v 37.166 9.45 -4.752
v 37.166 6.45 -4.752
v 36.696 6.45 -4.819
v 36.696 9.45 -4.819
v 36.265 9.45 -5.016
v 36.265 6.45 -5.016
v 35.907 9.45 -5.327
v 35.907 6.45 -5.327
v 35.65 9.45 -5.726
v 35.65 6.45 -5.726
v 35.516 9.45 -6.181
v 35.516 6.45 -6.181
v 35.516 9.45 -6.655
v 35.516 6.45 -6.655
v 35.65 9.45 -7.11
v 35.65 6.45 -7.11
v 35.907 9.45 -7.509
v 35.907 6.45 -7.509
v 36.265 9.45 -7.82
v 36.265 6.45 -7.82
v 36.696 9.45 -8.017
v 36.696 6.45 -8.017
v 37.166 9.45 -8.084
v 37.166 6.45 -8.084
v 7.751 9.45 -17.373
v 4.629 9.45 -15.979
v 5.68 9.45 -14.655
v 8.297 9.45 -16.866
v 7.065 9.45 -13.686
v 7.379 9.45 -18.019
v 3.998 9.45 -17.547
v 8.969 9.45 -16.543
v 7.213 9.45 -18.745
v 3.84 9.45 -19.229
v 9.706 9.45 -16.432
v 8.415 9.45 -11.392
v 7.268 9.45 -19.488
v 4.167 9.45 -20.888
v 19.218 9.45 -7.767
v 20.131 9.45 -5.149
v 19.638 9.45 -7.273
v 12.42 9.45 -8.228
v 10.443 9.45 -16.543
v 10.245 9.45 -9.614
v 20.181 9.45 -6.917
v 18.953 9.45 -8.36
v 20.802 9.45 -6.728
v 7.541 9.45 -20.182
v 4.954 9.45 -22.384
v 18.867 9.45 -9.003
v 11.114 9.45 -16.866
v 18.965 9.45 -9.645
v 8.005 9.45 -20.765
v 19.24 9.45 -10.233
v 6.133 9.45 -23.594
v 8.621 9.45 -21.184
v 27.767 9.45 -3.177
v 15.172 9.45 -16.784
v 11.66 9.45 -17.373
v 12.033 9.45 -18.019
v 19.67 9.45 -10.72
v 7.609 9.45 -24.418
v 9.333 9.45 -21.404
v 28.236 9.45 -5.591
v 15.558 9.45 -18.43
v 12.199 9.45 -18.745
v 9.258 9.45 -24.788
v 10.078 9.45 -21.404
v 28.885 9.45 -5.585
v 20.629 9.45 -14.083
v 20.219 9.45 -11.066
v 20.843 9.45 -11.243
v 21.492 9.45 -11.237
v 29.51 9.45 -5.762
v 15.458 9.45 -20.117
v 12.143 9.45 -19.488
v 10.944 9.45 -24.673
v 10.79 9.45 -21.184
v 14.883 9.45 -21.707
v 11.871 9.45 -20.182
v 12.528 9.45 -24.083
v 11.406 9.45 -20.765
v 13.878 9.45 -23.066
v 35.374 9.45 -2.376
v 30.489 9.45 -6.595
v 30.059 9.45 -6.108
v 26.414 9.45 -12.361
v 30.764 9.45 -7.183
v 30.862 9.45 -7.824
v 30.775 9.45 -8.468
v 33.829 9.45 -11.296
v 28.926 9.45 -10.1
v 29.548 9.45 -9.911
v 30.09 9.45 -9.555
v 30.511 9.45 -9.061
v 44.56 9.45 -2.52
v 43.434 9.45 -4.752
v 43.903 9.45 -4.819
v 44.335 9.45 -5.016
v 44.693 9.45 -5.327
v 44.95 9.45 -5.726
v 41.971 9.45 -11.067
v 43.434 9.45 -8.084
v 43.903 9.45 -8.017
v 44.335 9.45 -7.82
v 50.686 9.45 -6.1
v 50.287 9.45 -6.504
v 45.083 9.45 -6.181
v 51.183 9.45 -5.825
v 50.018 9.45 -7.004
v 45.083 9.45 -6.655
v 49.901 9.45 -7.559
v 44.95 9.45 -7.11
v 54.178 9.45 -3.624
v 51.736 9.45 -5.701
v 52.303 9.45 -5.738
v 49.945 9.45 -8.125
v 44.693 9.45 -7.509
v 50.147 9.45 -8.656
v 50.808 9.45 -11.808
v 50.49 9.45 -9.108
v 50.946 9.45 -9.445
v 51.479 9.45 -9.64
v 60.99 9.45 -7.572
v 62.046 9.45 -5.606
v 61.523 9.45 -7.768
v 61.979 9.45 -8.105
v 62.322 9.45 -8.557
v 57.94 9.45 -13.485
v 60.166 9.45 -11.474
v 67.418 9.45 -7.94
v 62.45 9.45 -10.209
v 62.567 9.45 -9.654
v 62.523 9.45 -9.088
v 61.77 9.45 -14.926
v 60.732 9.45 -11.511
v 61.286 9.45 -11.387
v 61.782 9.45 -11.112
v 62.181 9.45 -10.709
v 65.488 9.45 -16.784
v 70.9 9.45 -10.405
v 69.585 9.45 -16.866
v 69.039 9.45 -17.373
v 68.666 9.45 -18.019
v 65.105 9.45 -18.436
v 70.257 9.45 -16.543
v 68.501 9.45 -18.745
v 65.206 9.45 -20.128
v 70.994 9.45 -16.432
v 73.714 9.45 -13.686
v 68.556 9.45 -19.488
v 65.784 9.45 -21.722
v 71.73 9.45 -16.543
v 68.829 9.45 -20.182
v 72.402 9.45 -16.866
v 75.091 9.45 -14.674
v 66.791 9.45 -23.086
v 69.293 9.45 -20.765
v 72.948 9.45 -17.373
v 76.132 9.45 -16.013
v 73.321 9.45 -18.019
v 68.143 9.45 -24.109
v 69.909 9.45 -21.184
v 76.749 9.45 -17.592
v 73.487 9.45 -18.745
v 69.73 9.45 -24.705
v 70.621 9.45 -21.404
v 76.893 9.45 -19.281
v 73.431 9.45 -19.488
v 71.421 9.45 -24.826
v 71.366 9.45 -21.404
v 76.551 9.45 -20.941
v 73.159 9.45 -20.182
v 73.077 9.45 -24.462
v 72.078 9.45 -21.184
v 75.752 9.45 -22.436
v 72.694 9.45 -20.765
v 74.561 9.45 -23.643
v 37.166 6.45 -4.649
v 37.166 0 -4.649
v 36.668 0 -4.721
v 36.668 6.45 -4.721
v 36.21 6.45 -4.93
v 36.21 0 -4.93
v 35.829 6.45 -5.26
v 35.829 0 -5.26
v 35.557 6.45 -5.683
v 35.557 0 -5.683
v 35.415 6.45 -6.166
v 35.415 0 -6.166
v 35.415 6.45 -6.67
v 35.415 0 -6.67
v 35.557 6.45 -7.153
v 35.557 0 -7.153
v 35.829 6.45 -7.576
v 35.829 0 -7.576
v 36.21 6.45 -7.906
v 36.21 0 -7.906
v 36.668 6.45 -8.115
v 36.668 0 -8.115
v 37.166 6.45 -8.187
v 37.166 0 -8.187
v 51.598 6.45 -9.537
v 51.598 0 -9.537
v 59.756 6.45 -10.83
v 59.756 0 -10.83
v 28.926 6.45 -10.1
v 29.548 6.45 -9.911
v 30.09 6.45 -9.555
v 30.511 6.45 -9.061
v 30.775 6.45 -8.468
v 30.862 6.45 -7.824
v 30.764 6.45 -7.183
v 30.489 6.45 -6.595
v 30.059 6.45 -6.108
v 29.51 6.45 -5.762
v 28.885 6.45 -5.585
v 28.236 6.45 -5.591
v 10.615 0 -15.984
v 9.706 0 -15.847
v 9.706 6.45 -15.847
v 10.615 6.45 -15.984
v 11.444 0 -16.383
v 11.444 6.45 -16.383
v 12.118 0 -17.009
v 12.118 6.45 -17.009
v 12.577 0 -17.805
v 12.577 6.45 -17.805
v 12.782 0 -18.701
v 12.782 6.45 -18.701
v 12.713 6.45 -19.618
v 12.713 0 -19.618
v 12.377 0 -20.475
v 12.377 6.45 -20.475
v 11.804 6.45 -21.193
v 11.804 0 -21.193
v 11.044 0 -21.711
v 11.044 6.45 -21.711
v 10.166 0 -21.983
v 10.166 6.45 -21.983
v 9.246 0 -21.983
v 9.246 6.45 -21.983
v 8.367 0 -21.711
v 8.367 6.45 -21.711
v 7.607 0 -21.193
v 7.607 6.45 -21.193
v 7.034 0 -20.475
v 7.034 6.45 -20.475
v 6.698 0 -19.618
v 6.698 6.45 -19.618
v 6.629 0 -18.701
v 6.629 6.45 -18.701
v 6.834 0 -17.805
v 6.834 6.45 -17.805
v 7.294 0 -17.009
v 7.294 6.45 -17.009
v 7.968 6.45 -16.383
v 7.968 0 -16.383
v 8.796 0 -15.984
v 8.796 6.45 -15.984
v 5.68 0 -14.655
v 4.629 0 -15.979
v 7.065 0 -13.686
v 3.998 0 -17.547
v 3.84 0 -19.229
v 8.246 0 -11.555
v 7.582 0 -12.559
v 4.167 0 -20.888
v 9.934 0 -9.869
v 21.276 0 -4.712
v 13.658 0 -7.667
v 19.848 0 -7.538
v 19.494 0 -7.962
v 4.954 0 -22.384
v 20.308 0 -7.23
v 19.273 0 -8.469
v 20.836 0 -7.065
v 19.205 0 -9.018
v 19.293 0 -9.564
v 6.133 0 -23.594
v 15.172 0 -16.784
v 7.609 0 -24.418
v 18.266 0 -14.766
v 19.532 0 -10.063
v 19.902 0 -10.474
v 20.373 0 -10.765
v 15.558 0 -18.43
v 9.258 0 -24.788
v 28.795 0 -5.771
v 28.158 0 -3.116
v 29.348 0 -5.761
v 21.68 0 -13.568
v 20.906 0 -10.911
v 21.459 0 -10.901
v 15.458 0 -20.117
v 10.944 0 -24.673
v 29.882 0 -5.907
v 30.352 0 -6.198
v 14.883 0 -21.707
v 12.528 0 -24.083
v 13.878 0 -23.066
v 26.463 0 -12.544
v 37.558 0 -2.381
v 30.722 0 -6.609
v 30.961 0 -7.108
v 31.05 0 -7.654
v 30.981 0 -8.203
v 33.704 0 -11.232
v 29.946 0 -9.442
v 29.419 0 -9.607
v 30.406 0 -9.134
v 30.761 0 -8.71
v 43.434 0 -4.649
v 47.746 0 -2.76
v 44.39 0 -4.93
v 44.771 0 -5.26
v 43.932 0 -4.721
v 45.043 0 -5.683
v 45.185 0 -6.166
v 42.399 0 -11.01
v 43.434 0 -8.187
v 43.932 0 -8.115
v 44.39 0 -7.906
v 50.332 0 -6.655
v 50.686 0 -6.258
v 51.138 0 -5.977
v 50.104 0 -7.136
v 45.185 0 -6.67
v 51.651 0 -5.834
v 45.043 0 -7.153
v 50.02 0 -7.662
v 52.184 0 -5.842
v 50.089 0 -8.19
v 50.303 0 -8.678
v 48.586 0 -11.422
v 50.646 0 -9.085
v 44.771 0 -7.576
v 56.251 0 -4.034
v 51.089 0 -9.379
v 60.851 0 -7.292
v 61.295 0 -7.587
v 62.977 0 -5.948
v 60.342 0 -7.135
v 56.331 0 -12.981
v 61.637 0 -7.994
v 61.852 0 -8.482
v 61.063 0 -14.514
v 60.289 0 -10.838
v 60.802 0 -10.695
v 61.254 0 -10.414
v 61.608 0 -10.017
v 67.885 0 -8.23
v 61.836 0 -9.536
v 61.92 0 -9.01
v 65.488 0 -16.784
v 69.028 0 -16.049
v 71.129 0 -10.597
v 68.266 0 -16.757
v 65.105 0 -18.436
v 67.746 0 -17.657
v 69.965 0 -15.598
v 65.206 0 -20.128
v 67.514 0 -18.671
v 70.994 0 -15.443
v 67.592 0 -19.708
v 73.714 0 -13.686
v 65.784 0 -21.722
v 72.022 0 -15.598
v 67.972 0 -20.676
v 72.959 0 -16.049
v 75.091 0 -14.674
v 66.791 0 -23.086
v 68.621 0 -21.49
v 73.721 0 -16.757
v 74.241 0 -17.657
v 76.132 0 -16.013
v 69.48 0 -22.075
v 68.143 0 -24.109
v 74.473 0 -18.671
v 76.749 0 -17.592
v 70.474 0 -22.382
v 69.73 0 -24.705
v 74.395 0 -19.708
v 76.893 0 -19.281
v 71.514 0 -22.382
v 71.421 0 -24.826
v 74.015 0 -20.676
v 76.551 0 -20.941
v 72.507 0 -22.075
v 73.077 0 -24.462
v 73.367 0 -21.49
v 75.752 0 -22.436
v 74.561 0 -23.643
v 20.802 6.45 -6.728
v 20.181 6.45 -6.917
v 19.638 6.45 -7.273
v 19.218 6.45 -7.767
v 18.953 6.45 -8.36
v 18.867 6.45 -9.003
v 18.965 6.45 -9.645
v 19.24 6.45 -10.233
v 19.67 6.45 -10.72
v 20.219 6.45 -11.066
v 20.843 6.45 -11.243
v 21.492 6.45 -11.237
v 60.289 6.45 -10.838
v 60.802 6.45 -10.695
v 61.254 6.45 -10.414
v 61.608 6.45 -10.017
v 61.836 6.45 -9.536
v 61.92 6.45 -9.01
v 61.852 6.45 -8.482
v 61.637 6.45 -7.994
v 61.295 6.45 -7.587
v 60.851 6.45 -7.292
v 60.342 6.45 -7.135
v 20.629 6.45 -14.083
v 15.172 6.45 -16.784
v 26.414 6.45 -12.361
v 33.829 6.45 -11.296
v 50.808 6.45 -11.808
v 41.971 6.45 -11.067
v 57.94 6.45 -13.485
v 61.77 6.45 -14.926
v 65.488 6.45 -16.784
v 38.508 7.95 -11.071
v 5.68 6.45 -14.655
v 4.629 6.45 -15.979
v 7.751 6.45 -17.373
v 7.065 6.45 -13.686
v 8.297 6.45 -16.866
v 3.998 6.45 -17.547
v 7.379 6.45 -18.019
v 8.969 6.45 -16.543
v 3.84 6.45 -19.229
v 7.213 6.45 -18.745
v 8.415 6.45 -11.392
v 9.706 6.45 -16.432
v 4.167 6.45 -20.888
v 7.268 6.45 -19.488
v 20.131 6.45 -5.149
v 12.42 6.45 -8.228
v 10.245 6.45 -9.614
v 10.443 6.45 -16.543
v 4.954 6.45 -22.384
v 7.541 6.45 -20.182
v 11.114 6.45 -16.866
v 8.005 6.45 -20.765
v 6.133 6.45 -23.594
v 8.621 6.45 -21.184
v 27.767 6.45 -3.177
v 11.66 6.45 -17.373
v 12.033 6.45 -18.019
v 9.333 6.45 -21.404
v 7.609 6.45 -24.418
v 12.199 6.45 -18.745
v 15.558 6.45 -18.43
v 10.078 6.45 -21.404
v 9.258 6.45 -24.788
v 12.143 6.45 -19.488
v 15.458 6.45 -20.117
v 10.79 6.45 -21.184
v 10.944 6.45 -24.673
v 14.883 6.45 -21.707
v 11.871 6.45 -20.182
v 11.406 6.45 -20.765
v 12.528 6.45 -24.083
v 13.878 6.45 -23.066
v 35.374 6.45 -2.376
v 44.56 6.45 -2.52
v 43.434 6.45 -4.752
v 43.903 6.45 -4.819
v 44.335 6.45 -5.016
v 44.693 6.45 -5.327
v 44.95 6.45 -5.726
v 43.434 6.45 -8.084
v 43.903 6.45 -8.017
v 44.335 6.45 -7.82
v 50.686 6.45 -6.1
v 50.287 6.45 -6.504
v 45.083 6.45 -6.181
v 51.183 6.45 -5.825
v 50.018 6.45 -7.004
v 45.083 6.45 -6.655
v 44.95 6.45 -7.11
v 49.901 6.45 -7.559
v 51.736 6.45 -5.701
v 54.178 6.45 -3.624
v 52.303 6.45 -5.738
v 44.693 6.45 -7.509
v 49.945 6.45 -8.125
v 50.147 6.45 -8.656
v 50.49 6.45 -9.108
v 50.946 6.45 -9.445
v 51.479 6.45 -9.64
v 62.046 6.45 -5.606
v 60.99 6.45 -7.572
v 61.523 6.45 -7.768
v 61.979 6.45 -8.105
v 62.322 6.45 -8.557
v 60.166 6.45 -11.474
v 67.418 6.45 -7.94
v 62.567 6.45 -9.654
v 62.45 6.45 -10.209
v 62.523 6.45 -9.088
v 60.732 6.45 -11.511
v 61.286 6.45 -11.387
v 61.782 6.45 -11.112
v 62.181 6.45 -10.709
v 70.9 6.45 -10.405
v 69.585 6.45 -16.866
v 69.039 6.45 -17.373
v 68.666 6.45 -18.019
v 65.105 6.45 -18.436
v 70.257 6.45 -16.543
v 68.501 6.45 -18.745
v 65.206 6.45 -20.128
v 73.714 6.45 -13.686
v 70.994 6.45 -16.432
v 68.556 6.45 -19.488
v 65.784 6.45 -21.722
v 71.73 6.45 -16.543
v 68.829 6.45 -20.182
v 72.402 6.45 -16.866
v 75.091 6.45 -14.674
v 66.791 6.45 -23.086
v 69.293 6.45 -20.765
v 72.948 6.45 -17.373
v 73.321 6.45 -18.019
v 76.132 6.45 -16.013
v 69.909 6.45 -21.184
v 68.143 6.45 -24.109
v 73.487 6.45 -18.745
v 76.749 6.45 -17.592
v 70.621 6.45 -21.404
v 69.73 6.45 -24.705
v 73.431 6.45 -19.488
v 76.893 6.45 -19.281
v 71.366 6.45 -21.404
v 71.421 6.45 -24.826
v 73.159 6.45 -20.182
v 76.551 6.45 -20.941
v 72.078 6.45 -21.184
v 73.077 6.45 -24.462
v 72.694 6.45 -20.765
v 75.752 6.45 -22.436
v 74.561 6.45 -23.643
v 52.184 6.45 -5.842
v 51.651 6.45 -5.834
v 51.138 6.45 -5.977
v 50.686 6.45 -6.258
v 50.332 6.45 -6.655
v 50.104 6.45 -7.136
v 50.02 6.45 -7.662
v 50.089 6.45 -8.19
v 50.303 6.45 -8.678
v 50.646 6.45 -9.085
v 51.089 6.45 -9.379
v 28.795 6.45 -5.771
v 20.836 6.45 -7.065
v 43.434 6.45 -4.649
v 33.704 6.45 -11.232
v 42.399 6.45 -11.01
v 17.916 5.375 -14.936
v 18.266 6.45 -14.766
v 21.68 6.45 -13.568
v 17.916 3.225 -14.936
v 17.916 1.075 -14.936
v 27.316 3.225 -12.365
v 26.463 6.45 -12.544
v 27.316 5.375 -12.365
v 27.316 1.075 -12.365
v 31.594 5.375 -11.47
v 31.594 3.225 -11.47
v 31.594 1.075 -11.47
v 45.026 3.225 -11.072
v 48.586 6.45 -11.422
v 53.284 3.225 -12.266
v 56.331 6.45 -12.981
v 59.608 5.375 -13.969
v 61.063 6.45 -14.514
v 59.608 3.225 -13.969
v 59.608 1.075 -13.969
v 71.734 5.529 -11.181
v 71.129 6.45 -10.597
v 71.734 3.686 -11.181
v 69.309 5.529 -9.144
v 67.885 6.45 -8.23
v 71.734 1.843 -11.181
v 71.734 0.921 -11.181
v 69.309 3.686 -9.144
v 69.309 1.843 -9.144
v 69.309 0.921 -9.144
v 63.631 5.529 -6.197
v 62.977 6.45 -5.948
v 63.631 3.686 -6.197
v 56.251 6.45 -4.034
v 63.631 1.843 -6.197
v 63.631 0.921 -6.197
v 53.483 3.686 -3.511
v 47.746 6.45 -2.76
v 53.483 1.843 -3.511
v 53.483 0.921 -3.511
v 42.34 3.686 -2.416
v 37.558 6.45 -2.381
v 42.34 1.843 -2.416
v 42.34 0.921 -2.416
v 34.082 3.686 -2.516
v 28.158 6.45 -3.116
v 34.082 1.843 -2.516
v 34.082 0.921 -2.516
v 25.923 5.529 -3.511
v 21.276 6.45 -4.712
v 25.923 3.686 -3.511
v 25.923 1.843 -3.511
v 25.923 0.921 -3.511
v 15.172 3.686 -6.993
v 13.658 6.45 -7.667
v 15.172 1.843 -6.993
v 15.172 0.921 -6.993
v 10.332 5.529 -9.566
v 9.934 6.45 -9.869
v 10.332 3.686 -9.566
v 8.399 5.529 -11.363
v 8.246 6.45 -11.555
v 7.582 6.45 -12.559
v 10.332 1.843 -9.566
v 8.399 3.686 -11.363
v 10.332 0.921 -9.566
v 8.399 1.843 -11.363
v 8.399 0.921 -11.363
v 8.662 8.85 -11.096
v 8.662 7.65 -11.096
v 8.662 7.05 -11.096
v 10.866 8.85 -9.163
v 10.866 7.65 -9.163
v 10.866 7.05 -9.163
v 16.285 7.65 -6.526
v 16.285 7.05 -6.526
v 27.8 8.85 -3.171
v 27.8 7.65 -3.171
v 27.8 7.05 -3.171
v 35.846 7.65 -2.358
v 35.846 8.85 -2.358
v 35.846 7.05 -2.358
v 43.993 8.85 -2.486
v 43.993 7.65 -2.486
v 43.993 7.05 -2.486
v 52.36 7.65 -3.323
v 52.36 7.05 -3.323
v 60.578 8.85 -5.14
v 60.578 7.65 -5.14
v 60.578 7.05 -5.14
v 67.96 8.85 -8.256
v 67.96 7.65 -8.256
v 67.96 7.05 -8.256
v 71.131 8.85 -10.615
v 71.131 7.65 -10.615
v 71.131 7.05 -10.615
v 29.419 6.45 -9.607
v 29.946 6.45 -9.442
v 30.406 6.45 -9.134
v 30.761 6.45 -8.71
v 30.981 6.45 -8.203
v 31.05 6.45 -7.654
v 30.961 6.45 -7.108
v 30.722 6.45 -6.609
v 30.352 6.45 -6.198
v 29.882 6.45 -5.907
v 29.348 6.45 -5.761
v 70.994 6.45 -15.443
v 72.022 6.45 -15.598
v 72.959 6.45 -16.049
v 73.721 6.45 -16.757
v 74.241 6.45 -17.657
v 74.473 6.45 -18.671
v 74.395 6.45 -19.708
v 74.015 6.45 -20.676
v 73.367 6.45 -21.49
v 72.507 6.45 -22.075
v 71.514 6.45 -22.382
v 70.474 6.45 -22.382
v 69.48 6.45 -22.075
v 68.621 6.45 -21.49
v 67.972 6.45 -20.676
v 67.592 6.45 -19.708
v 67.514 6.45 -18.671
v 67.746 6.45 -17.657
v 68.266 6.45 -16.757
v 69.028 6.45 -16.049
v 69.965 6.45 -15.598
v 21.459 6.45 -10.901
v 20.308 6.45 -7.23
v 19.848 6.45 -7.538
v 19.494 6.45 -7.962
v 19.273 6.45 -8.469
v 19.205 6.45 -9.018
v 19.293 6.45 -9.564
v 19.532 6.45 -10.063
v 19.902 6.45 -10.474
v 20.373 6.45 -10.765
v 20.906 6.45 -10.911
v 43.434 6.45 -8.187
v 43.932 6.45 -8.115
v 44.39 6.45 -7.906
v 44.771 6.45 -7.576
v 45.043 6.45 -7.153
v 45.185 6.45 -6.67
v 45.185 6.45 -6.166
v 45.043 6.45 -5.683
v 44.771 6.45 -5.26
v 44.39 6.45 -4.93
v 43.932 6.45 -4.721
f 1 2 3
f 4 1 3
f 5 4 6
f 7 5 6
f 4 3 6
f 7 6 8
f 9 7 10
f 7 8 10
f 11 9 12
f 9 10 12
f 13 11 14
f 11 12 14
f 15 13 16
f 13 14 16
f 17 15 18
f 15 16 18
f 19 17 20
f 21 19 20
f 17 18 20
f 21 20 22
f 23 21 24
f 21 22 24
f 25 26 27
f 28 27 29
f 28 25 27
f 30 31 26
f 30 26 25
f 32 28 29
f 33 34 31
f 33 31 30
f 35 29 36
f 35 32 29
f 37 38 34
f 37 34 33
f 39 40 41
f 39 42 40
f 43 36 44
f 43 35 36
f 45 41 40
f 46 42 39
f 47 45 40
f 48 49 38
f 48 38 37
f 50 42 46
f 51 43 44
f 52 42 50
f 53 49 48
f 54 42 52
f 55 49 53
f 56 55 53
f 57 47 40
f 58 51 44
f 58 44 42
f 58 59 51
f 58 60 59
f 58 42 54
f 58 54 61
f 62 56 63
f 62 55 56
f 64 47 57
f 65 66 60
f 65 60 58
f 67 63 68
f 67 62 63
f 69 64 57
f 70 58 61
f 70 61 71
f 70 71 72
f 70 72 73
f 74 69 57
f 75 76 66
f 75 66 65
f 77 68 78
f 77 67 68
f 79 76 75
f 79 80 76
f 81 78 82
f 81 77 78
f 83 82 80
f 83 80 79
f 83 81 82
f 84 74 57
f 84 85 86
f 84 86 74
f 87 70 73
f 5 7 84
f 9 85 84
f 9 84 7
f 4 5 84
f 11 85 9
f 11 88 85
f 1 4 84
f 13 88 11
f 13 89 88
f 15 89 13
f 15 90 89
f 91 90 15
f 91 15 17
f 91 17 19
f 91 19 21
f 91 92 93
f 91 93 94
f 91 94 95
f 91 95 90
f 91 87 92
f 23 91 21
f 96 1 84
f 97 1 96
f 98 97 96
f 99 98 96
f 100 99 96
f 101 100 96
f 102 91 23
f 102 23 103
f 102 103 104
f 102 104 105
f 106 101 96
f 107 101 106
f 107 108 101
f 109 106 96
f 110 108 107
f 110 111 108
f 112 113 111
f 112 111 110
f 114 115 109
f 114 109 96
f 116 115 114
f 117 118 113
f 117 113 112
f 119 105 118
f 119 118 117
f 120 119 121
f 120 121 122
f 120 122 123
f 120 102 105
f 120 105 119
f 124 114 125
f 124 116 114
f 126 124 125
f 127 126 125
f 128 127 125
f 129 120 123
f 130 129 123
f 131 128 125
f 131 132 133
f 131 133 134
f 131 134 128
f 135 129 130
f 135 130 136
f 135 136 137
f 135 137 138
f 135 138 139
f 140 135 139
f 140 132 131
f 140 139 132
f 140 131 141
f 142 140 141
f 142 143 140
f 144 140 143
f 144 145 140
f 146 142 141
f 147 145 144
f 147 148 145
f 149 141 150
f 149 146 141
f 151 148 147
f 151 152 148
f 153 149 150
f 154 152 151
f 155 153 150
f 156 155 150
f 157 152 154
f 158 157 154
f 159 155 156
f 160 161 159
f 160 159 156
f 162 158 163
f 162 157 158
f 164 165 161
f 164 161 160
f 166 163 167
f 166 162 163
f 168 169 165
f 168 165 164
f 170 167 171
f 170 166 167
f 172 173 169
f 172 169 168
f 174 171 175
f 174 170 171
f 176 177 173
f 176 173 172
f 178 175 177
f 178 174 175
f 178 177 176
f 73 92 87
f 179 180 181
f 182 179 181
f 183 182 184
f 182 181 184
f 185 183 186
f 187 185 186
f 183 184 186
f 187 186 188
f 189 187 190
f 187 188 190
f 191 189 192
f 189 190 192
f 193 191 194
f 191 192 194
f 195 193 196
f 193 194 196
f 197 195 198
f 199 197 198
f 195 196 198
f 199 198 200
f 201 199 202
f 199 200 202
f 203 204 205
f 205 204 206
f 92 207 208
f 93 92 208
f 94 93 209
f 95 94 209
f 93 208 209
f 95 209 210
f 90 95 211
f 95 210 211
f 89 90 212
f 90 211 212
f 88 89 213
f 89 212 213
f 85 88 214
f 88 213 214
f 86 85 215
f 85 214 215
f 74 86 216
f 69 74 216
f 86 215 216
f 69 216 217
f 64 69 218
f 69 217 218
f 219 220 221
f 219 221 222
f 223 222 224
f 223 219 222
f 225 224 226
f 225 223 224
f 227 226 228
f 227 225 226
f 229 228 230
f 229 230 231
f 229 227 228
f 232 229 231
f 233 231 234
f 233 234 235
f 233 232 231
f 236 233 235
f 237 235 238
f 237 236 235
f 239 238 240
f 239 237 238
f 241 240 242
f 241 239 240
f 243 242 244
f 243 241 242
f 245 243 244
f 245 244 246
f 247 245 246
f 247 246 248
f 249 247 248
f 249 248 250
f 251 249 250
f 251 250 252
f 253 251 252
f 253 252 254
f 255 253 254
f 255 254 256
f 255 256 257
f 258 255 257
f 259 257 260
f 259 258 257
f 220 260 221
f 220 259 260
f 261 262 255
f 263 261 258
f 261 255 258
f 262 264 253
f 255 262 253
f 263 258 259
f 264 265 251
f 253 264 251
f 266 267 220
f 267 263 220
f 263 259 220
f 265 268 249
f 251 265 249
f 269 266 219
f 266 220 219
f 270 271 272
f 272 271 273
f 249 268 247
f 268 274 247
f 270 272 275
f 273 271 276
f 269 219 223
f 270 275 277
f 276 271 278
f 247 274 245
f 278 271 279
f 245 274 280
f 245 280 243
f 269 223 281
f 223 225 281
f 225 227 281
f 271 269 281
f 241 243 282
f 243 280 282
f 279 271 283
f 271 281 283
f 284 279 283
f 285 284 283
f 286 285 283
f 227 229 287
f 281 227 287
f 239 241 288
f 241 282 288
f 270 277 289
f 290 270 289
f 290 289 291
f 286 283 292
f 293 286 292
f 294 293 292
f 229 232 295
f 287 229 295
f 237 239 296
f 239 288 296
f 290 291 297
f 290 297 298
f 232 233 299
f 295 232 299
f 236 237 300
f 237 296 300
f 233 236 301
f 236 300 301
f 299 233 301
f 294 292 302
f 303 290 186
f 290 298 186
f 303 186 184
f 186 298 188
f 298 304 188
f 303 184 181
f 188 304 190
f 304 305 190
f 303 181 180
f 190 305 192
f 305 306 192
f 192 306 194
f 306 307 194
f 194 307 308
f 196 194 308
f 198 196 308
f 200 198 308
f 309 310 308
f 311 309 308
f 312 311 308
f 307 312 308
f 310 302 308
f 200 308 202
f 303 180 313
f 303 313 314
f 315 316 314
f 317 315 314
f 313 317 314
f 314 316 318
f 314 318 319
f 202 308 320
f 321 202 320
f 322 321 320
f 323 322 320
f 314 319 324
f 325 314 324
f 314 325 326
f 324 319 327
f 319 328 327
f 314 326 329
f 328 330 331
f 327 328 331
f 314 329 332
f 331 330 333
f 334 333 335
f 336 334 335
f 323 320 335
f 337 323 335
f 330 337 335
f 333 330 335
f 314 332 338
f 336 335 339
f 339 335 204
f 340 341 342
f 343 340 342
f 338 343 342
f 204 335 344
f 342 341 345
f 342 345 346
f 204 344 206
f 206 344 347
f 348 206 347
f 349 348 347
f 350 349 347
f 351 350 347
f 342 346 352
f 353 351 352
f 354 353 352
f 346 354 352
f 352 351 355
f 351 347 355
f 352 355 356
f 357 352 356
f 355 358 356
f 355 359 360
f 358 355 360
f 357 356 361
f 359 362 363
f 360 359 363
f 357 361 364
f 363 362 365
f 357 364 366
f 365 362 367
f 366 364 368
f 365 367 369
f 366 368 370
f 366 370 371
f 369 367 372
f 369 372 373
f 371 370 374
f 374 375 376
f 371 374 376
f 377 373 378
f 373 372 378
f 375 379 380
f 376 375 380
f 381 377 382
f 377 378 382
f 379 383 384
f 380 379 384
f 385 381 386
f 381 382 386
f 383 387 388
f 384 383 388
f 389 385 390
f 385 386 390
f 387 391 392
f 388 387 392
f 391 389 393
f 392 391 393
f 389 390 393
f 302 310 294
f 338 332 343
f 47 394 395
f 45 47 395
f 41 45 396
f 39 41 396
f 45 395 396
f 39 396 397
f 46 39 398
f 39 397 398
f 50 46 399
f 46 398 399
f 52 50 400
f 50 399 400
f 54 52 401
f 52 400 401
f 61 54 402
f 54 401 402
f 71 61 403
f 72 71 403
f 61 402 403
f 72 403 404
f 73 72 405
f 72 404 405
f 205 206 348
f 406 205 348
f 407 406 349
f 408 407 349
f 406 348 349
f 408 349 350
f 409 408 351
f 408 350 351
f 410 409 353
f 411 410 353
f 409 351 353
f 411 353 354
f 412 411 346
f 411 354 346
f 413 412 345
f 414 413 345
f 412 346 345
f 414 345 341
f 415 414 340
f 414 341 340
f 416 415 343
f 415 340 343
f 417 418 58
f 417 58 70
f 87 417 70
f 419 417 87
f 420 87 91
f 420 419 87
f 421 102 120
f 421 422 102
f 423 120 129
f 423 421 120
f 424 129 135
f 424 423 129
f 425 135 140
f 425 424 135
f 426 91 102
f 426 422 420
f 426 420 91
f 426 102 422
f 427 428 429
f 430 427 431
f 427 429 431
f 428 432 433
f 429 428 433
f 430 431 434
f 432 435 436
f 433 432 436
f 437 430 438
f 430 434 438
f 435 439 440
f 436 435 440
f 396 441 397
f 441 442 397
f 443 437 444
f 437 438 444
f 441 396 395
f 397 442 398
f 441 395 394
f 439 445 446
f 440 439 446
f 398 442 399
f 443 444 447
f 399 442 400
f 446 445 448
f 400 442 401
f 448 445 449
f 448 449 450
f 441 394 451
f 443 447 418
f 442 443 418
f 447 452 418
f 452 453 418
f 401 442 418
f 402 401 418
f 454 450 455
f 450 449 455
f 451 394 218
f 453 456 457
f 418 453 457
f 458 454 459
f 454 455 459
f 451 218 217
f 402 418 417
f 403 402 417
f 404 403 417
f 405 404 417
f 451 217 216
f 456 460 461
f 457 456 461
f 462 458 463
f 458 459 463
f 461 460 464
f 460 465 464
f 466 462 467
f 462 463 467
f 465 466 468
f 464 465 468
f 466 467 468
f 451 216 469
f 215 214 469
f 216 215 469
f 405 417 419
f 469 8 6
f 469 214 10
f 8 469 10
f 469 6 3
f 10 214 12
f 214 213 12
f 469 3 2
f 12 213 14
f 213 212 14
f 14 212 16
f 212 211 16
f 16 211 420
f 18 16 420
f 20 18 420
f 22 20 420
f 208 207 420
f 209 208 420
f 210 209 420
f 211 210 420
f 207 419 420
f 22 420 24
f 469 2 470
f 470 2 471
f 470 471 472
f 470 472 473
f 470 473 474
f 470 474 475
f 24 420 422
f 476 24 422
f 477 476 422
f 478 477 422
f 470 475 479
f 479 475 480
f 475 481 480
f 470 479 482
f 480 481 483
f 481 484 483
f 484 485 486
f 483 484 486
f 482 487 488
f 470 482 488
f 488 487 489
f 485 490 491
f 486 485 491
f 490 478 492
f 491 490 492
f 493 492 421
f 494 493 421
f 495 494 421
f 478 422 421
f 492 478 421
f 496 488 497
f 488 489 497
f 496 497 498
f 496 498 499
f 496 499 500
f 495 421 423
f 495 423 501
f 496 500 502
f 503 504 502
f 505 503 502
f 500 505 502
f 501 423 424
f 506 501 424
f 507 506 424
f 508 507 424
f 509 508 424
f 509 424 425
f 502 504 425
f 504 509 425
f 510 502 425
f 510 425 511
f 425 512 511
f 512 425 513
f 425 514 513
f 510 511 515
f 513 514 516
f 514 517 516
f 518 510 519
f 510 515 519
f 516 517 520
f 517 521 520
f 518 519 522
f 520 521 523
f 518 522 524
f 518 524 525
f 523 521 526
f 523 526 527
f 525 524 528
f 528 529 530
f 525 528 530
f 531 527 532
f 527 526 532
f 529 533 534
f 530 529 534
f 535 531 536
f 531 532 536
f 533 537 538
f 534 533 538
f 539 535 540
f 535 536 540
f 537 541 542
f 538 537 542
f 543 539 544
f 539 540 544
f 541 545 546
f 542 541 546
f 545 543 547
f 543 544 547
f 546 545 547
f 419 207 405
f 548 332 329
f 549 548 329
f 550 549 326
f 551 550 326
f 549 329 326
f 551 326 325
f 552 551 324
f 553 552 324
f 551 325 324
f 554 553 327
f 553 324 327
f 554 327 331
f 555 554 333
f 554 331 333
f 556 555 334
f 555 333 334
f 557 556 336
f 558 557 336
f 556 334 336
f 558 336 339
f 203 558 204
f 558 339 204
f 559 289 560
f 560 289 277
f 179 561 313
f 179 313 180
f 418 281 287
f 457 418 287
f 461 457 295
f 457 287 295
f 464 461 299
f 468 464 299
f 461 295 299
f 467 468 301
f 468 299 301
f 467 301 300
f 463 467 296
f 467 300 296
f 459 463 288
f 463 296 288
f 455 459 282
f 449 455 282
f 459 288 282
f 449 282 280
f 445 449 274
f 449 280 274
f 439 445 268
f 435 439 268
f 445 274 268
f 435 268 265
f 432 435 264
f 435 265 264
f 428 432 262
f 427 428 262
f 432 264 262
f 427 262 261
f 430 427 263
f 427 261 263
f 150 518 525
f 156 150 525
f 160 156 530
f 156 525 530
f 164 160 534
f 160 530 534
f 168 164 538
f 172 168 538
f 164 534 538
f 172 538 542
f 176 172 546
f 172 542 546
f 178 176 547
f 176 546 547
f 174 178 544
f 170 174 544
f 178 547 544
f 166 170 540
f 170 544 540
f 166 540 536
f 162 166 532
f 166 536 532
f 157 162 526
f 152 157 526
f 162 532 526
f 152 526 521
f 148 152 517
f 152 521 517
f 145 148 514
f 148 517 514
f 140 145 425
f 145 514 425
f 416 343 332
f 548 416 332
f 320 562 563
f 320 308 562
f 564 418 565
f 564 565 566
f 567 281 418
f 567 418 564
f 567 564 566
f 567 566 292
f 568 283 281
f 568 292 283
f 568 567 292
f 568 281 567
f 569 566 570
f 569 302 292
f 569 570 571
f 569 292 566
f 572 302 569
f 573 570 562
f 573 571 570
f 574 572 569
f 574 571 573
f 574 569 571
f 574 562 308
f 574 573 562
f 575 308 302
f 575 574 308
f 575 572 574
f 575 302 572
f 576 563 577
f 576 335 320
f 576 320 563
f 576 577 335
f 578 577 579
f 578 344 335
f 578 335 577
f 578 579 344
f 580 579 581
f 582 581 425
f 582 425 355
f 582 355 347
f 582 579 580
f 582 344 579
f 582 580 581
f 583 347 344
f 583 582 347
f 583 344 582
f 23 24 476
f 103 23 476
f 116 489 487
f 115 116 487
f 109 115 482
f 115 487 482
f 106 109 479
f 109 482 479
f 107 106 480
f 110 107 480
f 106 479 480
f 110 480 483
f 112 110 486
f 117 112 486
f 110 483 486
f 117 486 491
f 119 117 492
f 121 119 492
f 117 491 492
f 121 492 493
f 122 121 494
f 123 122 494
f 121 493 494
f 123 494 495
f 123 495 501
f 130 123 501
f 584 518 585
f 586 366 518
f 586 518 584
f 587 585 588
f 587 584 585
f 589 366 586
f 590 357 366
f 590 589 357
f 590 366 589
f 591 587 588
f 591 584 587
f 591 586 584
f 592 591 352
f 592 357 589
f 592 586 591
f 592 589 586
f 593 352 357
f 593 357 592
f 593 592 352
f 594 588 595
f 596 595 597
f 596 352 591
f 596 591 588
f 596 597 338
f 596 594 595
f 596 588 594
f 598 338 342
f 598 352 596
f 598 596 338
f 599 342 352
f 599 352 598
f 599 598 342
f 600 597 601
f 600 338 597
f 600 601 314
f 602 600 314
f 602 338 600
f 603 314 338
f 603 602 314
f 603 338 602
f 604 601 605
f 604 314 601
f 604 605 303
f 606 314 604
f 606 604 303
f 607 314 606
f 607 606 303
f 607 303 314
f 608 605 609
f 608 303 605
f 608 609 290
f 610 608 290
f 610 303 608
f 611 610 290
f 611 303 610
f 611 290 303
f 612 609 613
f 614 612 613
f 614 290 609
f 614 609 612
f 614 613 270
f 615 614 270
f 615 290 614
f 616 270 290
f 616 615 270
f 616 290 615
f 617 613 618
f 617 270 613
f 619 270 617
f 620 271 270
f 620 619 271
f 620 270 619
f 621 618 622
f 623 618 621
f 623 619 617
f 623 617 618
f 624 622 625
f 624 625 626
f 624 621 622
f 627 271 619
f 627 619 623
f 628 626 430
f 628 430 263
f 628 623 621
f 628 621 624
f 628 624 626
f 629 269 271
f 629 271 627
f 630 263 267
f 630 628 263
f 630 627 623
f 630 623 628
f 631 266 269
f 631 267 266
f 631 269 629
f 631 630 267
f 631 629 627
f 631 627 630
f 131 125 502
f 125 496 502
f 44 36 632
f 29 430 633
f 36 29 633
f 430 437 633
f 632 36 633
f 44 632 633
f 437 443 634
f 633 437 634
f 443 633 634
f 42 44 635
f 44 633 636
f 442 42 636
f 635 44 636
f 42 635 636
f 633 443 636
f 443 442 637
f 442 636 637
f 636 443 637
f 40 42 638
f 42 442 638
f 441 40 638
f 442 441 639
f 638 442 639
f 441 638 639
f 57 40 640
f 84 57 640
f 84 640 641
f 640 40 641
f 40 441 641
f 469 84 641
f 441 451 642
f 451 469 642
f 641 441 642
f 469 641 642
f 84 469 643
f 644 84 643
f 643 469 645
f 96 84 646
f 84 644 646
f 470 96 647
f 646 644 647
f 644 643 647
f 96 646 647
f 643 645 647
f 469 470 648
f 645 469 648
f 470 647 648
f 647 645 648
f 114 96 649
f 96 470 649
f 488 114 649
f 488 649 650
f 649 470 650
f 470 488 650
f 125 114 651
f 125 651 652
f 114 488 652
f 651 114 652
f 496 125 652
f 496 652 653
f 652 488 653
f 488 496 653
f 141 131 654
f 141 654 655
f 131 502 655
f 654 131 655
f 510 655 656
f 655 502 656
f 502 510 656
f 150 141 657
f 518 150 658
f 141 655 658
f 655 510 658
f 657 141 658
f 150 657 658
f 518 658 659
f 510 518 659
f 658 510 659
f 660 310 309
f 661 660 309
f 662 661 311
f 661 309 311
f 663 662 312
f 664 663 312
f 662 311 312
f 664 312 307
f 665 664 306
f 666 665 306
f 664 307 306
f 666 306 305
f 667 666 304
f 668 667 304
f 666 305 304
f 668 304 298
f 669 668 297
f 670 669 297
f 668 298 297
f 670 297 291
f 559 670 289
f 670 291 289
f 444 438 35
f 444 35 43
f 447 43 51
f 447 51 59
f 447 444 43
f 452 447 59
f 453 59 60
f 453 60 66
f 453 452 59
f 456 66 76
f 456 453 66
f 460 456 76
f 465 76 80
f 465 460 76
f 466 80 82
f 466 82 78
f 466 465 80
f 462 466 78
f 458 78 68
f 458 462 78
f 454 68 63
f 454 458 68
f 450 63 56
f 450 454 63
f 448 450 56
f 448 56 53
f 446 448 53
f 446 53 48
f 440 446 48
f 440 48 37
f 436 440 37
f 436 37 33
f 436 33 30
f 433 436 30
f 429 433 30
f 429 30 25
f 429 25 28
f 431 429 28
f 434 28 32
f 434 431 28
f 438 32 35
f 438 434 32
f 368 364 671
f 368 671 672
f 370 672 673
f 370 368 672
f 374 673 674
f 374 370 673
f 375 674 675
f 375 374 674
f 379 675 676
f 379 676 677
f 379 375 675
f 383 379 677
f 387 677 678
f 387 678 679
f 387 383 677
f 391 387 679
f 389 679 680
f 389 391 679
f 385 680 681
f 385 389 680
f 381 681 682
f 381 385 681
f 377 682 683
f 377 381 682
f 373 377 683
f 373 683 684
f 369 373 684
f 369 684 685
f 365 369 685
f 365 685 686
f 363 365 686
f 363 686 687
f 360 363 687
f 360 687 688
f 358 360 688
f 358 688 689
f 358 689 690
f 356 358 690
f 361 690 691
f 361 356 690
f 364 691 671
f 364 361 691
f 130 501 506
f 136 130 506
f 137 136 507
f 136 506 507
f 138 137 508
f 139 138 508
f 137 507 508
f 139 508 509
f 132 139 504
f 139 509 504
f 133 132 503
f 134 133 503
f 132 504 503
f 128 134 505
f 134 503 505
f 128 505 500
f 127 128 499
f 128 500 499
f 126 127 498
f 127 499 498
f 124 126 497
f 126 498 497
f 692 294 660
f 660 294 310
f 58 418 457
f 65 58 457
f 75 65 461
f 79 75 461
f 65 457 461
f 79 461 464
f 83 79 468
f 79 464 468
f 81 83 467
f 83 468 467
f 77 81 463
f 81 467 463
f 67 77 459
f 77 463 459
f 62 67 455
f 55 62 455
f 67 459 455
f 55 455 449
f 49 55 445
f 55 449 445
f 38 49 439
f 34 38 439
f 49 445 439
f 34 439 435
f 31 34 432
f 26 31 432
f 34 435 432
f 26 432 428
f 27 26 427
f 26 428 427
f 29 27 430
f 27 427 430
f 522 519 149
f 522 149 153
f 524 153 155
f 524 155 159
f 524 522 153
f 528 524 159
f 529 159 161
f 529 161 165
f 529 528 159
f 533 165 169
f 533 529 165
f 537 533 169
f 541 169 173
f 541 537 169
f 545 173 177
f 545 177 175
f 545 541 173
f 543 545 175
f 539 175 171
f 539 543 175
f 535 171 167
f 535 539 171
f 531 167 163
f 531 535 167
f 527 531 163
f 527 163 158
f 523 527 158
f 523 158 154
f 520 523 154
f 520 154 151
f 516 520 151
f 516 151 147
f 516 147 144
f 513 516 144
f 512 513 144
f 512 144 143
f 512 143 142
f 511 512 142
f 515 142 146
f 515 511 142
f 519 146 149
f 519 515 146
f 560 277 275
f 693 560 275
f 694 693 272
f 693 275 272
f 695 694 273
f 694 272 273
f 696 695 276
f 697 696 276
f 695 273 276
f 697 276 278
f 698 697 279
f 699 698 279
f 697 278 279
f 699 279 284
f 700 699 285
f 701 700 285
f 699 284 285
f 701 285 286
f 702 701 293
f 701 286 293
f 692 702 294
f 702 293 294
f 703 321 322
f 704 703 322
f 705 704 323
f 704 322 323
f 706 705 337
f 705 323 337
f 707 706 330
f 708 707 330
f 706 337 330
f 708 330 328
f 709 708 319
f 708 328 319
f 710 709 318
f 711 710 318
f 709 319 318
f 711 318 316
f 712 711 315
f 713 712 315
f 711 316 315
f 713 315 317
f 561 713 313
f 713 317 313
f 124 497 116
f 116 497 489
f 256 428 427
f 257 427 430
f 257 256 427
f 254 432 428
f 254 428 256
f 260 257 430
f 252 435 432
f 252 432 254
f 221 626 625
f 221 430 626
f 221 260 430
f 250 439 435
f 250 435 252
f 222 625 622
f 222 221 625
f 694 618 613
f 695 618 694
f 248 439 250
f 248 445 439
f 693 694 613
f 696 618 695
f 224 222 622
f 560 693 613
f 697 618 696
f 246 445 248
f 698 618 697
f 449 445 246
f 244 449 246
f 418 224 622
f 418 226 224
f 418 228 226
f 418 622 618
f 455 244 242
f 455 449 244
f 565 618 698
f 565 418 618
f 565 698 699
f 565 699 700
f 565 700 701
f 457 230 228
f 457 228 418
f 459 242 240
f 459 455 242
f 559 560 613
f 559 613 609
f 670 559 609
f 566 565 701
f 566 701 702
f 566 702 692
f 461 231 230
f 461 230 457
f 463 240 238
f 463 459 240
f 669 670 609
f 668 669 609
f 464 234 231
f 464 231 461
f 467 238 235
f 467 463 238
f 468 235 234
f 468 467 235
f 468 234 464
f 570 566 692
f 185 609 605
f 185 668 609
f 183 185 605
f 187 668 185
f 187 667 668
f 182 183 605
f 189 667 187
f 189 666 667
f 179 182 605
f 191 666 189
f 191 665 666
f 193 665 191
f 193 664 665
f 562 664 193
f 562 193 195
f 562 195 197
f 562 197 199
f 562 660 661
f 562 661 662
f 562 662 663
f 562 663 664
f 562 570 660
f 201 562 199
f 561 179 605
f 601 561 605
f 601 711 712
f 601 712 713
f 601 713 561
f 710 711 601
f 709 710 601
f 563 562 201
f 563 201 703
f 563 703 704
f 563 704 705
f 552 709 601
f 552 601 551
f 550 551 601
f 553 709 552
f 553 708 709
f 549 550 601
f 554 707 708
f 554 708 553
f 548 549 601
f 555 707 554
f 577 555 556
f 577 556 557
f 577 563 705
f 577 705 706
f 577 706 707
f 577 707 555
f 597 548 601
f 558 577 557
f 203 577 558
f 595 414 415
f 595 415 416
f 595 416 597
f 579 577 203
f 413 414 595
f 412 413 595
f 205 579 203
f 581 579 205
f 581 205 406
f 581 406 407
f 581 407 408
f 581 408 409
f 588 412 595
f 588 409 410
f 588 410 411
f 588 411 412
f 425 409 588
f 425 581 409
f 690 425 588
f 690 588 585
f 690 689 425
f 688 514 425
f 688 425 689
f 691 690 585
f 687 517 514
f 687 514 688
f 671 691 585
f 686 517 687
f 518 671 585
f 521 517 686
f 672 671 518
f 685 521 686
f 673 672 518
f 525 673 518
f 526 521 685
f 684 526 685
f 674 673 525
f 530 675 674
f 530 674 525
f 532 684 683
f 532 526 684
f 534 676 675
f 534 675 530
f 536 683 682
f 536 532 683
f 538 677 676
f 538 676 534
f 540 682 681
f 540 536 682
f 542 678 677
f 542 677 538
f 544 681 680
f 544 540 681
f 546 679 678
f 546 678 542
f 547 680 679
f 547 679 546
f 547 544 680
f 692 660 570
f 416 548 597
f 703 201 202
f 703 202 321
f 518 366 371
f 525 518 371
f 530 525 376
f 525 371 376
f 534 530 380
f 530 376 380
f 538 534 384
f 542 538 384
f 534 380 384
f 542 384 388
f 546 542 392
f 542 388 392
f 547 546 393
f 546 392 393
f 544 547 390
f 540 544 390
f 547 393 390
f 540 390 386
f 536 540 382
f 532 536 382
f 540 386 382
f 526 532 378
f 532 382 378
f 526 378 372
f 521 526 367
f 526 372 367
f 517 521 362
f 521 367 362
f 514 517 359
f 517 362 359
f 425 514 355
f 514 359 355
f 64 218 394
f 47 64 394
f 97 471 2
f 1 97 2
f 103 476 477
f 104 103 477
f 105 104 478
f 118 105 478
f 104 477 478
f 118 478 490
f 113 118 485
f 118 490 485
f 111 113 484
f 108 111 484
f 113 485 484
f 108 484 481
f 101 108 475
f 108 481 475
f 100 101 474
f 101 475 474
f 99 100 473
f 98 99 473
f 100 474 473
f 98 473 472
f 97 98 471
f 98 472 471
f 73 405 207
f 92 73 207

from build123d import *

# Parameters (mm, degrees)
SKETCH1_R           = 23.914626161
SKETCH1_R_2         = 27.045967385
BOSS_EXTRUDE1_DEPTH = 50
SCALE1_SCALE        = 0.129
SKETCH2_R           = 2.5
BOSS_EXTRUDE2_DEPTH = 3


with BuildPart() as part:
    # Sketch1 → Boss-Extrude1 (new body)
    with BuildSketch(Plane(origin=(0, 0, 0), x_dir=(1, 0, 0), z_dir=(0, 1, 0))):
        with BuildLine():
            ThreePointArc((571.425583032, 106.091006627), (566.486987495, 189.629943358), (507.659430695, 130.111356034))
            add(Edge.make_bspline(
                [(117.616005389, 130.111356034), (144.204175433, 106.457187383), (190.140627657, 101.864407344), (251.031237952, 86.215342563), (297.388019365, 86.131933075), (353.707264697, 84.167516941), (425.305720231, 96.17721663), (479.049506306, 111.535146669), (507.659430695, 130.111356034)],
                knots=[0, 0, 0, 0, 0.249670304, 0.333275294, 0.464807215, 0.590409482, 0.750006161, 1, 1, 1, 1], degree=3))
            ThreePointArc((117.616005389, 130.111356034), (58.983549296, 189.290353432), (54.766046274, 106.091006627))
            add(Edge.make_bspline(
                [(571.425583032, 106.091006627), (553.696805918, 77.53126711), (499.791617773, 45.759891324), (413.175222585, 24.948039658), (335.79505031, 17.702360032), (264.341352743, 18.472230801), (192.346991209, 26.140942246), (119.359983644, 51.307887822), (64.762558388, 78.873591576), (54.766046274, 106.091006627)],
                knots=[0, 0, 0, 0, 0.174458769, 0.318401703, 0.471929438, 0.585167873, 0.697862641, 0.852812349, 1, 1, 1, 1], degree=3))
        make_face()
        with Locations(Location((75.238108492, 146.759815529, 0), (0, 0, 270))):
            Circle(SKETCH1_R, mode=Mode.SUBTRACT)
        with Locations(Location((550.33805249, 146.759815529, 0), (0, 0, 270))):
            Circle(SKETCH1_R_2, mode=Mode.SUBTRACT)
        with BuildLine():
            Line((166.349894849, 84.502000807), (228.051186277, 74.47554095))
            ThreePointArc((228.051186277, 74.47554095), (240.503805912, 57.190561457), (223.218826419, 44.737941823))
            Line((223.218826419, 44.737941823), (161.517534991, 54.76440168))
            ThreePointArc((161.517534991, 54.76440168), (149.064915357, 72.049381173), (166.349894849, 84.502000807))
        make_face(mode=Mode.SUBTRACT)
        with BuildLine():
            Line((288.10756392, 63.463072101), (336.697330919, 63.463072101))
            ThreePointArc((336.697330919, 63.463072101), (350.409231268, 49.751171752), (336.697330919, 36.039271403))
            Line((336.697330919, 36.039271403), (288.10756392, 36.039271403))
            ThreePointArc((288.10756392, 36.039271403), (274.395663571, 49.751171752), (288.10756392, 63.463072101))
        make_face(mode=Mode.SUBTRACT)
        with BuildLine():
            Line((399.984344642, 73.929040649), (463.228168356, 83.955500506))
            ThreePointArc((463.228168356, 83.955500506), (479.821076039, 71.903809663), (467.769385196, 55.310901981))
            Line((467.769385196, 55.310901981), (404.525561482, 45.284442124))
            ThreePointArc((404.525561482, 45.284442124), (387.932653799, 57.336132967), (399.984344642, 73.929040649))
        make_face(mode=Mode.SUBTRACT)
    extrude(amount=BOSS_EXTRUDE1_DEPTH)


with BuildPart() as part_1:
    # Scale1: scaled about (0, 0, 0)
    add(part.part.scale(SCALE1_SCALE))


with BuildPart() as body_2:
    # Sketch2 → Boss-Extrude2 (new body)
    with BuildSketch(Plane(origin=(0, 6.45, 0), x_dir=(1, 0, 0), z_dir=(0, 1, 0))):
        with BuildLine():
            ThreePointArc((15.172464695, 16.784364928), (7.608877859, 24.418455593), (7.064819969, 13.685739855))
            add(Edge.make_bspline(
                [(7.064819969, 13.685739855), (8.699625863, 9.712450747), (16.300094229, 6.251497582), (29.024850934, 2.261026078), (44.257727724, 2.126809747), (60.420559919, 4.181195739), (70.74333497, 9.057181937), (73.713900211, 13.685739855)],
                knots=[0, 0, 0, 0, 0.164036027, 0.328594656, 0.550970823, 0.781411037, 1, 1, 1, 1], degree=3))
            ThreePointArc((73.713900211, 13.685739855), (73.076821387, 24.462262693), (65.48806656, 16.784364928))
            add(Edge.make_bspline(
                [(15.172464695, 16.784364928), (22.17757472, 12.442347393), (39.749105334, 9.85440517), (57.182599296, 12.057544833), (65.48806656, 16.784364928)],
                knots=[0, 0, 0, 0, 0.46554641, 1, 1, 1, 1], degree=3))
        make_face()
        with Locations(Location((9.705715995, 18.932016203, 0), (0, 0, 270))):
            Circle(SKETCH2_R, mode=Mode.SUBTRACT)
        with Locations(Location((70.993608771, 18.932016203, 0), (0, 0, 270))):
            Circle(SKETCH2_R, mode=Mode.SUBTRACT)
        with BuildLine():
            Line((21.4924466, 11.237160007), (28.926349197, 10.099567194))
            ThreePointArc((28.926349197, 10.099567194), (30.835828868, 7.500092772), (28.236354446, 5.590613101))
            Line((28.236354446, 5.590613101), (20.802451849, 6.728205914))
            ThreePointArc((20.802451849, 6.728205914), (18.892972178, 9.327680336), (21.4924466, 11.237160007))
        make_face(mode=Mode.SUBTRACT)
        with BuildLine():
            Line((37.165875746, 8.084242421), (43.433955689, 8.084242421))
            ThreePointArc((43.433955689, 8.084242421), (45.100296953, 6.417901156), (43.433955689, 4.751559891))
            Line((43.433955689, 4.751559891), (37.165875746, 4.751559891))
            ThreePointArc((37.165875746, 4.751559891), (35.499534481, 6.417901156), (37.165875746, 8.084242421))
        make_face(mode=Mode.SUBTRACT)
        with BuildLine():
            Line((51.478956048, 9.640215153), (60.165724042, 11.474385038))
            ThreePointArc((60.165724042, 11.474385038), (62.528602453, 9.935372422), (60.989589837, 7.57249401))
            Line((60.989589837, 7.57249401), (52.302821842, 5.738324125))
            ThreePointArc((52.302821842, 5.738324125), (49.939943431, 7.277336741), (51.478956048, 9.640215153))
        make_face(mode=Mode.SUBTRACT)
    extrude(amount=BOSS_EXTRUDE2_DEPTH)


solid = Compound([part_1.part, body_2.part])
